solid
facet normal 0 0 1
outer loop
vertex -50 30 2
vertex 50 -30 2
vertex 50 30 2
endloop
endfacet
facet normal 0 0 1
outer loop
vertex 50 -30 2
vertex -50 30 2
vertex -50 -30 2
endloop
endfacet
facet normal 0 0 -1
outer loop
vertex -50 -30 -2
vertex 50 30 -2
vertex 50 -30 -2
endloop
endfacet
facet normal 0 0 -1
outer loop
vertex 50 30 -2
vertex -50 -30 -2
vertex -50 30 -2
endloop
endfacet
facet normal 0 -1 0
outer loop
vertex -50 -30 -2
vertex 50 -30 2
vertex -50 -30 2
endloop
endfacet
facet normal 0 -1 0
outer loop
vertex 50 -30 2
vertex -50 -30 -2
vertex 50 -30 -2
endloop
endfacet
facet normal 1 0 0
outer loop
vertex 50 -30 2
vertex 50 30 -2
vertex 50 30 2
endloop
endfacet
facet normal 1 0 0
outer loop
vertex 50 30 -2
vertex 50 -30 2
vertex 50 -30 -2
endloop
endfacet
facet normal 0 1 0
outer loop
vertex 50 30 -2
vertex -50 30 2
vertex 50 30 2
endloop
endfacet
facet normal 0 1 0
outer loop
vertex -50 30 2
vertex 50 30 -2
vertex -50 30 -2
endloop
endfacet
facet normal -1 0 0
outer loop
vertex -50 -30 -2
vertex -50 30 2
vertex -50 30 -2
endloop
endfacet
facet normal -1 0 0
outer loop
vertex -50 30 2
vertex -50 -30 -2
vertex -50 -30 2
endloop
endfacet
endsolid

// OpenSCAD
module plateau_rectangulaire()
{
	cube(size = [100,60,4], center = true);
}

plateau_rectangulaire();
